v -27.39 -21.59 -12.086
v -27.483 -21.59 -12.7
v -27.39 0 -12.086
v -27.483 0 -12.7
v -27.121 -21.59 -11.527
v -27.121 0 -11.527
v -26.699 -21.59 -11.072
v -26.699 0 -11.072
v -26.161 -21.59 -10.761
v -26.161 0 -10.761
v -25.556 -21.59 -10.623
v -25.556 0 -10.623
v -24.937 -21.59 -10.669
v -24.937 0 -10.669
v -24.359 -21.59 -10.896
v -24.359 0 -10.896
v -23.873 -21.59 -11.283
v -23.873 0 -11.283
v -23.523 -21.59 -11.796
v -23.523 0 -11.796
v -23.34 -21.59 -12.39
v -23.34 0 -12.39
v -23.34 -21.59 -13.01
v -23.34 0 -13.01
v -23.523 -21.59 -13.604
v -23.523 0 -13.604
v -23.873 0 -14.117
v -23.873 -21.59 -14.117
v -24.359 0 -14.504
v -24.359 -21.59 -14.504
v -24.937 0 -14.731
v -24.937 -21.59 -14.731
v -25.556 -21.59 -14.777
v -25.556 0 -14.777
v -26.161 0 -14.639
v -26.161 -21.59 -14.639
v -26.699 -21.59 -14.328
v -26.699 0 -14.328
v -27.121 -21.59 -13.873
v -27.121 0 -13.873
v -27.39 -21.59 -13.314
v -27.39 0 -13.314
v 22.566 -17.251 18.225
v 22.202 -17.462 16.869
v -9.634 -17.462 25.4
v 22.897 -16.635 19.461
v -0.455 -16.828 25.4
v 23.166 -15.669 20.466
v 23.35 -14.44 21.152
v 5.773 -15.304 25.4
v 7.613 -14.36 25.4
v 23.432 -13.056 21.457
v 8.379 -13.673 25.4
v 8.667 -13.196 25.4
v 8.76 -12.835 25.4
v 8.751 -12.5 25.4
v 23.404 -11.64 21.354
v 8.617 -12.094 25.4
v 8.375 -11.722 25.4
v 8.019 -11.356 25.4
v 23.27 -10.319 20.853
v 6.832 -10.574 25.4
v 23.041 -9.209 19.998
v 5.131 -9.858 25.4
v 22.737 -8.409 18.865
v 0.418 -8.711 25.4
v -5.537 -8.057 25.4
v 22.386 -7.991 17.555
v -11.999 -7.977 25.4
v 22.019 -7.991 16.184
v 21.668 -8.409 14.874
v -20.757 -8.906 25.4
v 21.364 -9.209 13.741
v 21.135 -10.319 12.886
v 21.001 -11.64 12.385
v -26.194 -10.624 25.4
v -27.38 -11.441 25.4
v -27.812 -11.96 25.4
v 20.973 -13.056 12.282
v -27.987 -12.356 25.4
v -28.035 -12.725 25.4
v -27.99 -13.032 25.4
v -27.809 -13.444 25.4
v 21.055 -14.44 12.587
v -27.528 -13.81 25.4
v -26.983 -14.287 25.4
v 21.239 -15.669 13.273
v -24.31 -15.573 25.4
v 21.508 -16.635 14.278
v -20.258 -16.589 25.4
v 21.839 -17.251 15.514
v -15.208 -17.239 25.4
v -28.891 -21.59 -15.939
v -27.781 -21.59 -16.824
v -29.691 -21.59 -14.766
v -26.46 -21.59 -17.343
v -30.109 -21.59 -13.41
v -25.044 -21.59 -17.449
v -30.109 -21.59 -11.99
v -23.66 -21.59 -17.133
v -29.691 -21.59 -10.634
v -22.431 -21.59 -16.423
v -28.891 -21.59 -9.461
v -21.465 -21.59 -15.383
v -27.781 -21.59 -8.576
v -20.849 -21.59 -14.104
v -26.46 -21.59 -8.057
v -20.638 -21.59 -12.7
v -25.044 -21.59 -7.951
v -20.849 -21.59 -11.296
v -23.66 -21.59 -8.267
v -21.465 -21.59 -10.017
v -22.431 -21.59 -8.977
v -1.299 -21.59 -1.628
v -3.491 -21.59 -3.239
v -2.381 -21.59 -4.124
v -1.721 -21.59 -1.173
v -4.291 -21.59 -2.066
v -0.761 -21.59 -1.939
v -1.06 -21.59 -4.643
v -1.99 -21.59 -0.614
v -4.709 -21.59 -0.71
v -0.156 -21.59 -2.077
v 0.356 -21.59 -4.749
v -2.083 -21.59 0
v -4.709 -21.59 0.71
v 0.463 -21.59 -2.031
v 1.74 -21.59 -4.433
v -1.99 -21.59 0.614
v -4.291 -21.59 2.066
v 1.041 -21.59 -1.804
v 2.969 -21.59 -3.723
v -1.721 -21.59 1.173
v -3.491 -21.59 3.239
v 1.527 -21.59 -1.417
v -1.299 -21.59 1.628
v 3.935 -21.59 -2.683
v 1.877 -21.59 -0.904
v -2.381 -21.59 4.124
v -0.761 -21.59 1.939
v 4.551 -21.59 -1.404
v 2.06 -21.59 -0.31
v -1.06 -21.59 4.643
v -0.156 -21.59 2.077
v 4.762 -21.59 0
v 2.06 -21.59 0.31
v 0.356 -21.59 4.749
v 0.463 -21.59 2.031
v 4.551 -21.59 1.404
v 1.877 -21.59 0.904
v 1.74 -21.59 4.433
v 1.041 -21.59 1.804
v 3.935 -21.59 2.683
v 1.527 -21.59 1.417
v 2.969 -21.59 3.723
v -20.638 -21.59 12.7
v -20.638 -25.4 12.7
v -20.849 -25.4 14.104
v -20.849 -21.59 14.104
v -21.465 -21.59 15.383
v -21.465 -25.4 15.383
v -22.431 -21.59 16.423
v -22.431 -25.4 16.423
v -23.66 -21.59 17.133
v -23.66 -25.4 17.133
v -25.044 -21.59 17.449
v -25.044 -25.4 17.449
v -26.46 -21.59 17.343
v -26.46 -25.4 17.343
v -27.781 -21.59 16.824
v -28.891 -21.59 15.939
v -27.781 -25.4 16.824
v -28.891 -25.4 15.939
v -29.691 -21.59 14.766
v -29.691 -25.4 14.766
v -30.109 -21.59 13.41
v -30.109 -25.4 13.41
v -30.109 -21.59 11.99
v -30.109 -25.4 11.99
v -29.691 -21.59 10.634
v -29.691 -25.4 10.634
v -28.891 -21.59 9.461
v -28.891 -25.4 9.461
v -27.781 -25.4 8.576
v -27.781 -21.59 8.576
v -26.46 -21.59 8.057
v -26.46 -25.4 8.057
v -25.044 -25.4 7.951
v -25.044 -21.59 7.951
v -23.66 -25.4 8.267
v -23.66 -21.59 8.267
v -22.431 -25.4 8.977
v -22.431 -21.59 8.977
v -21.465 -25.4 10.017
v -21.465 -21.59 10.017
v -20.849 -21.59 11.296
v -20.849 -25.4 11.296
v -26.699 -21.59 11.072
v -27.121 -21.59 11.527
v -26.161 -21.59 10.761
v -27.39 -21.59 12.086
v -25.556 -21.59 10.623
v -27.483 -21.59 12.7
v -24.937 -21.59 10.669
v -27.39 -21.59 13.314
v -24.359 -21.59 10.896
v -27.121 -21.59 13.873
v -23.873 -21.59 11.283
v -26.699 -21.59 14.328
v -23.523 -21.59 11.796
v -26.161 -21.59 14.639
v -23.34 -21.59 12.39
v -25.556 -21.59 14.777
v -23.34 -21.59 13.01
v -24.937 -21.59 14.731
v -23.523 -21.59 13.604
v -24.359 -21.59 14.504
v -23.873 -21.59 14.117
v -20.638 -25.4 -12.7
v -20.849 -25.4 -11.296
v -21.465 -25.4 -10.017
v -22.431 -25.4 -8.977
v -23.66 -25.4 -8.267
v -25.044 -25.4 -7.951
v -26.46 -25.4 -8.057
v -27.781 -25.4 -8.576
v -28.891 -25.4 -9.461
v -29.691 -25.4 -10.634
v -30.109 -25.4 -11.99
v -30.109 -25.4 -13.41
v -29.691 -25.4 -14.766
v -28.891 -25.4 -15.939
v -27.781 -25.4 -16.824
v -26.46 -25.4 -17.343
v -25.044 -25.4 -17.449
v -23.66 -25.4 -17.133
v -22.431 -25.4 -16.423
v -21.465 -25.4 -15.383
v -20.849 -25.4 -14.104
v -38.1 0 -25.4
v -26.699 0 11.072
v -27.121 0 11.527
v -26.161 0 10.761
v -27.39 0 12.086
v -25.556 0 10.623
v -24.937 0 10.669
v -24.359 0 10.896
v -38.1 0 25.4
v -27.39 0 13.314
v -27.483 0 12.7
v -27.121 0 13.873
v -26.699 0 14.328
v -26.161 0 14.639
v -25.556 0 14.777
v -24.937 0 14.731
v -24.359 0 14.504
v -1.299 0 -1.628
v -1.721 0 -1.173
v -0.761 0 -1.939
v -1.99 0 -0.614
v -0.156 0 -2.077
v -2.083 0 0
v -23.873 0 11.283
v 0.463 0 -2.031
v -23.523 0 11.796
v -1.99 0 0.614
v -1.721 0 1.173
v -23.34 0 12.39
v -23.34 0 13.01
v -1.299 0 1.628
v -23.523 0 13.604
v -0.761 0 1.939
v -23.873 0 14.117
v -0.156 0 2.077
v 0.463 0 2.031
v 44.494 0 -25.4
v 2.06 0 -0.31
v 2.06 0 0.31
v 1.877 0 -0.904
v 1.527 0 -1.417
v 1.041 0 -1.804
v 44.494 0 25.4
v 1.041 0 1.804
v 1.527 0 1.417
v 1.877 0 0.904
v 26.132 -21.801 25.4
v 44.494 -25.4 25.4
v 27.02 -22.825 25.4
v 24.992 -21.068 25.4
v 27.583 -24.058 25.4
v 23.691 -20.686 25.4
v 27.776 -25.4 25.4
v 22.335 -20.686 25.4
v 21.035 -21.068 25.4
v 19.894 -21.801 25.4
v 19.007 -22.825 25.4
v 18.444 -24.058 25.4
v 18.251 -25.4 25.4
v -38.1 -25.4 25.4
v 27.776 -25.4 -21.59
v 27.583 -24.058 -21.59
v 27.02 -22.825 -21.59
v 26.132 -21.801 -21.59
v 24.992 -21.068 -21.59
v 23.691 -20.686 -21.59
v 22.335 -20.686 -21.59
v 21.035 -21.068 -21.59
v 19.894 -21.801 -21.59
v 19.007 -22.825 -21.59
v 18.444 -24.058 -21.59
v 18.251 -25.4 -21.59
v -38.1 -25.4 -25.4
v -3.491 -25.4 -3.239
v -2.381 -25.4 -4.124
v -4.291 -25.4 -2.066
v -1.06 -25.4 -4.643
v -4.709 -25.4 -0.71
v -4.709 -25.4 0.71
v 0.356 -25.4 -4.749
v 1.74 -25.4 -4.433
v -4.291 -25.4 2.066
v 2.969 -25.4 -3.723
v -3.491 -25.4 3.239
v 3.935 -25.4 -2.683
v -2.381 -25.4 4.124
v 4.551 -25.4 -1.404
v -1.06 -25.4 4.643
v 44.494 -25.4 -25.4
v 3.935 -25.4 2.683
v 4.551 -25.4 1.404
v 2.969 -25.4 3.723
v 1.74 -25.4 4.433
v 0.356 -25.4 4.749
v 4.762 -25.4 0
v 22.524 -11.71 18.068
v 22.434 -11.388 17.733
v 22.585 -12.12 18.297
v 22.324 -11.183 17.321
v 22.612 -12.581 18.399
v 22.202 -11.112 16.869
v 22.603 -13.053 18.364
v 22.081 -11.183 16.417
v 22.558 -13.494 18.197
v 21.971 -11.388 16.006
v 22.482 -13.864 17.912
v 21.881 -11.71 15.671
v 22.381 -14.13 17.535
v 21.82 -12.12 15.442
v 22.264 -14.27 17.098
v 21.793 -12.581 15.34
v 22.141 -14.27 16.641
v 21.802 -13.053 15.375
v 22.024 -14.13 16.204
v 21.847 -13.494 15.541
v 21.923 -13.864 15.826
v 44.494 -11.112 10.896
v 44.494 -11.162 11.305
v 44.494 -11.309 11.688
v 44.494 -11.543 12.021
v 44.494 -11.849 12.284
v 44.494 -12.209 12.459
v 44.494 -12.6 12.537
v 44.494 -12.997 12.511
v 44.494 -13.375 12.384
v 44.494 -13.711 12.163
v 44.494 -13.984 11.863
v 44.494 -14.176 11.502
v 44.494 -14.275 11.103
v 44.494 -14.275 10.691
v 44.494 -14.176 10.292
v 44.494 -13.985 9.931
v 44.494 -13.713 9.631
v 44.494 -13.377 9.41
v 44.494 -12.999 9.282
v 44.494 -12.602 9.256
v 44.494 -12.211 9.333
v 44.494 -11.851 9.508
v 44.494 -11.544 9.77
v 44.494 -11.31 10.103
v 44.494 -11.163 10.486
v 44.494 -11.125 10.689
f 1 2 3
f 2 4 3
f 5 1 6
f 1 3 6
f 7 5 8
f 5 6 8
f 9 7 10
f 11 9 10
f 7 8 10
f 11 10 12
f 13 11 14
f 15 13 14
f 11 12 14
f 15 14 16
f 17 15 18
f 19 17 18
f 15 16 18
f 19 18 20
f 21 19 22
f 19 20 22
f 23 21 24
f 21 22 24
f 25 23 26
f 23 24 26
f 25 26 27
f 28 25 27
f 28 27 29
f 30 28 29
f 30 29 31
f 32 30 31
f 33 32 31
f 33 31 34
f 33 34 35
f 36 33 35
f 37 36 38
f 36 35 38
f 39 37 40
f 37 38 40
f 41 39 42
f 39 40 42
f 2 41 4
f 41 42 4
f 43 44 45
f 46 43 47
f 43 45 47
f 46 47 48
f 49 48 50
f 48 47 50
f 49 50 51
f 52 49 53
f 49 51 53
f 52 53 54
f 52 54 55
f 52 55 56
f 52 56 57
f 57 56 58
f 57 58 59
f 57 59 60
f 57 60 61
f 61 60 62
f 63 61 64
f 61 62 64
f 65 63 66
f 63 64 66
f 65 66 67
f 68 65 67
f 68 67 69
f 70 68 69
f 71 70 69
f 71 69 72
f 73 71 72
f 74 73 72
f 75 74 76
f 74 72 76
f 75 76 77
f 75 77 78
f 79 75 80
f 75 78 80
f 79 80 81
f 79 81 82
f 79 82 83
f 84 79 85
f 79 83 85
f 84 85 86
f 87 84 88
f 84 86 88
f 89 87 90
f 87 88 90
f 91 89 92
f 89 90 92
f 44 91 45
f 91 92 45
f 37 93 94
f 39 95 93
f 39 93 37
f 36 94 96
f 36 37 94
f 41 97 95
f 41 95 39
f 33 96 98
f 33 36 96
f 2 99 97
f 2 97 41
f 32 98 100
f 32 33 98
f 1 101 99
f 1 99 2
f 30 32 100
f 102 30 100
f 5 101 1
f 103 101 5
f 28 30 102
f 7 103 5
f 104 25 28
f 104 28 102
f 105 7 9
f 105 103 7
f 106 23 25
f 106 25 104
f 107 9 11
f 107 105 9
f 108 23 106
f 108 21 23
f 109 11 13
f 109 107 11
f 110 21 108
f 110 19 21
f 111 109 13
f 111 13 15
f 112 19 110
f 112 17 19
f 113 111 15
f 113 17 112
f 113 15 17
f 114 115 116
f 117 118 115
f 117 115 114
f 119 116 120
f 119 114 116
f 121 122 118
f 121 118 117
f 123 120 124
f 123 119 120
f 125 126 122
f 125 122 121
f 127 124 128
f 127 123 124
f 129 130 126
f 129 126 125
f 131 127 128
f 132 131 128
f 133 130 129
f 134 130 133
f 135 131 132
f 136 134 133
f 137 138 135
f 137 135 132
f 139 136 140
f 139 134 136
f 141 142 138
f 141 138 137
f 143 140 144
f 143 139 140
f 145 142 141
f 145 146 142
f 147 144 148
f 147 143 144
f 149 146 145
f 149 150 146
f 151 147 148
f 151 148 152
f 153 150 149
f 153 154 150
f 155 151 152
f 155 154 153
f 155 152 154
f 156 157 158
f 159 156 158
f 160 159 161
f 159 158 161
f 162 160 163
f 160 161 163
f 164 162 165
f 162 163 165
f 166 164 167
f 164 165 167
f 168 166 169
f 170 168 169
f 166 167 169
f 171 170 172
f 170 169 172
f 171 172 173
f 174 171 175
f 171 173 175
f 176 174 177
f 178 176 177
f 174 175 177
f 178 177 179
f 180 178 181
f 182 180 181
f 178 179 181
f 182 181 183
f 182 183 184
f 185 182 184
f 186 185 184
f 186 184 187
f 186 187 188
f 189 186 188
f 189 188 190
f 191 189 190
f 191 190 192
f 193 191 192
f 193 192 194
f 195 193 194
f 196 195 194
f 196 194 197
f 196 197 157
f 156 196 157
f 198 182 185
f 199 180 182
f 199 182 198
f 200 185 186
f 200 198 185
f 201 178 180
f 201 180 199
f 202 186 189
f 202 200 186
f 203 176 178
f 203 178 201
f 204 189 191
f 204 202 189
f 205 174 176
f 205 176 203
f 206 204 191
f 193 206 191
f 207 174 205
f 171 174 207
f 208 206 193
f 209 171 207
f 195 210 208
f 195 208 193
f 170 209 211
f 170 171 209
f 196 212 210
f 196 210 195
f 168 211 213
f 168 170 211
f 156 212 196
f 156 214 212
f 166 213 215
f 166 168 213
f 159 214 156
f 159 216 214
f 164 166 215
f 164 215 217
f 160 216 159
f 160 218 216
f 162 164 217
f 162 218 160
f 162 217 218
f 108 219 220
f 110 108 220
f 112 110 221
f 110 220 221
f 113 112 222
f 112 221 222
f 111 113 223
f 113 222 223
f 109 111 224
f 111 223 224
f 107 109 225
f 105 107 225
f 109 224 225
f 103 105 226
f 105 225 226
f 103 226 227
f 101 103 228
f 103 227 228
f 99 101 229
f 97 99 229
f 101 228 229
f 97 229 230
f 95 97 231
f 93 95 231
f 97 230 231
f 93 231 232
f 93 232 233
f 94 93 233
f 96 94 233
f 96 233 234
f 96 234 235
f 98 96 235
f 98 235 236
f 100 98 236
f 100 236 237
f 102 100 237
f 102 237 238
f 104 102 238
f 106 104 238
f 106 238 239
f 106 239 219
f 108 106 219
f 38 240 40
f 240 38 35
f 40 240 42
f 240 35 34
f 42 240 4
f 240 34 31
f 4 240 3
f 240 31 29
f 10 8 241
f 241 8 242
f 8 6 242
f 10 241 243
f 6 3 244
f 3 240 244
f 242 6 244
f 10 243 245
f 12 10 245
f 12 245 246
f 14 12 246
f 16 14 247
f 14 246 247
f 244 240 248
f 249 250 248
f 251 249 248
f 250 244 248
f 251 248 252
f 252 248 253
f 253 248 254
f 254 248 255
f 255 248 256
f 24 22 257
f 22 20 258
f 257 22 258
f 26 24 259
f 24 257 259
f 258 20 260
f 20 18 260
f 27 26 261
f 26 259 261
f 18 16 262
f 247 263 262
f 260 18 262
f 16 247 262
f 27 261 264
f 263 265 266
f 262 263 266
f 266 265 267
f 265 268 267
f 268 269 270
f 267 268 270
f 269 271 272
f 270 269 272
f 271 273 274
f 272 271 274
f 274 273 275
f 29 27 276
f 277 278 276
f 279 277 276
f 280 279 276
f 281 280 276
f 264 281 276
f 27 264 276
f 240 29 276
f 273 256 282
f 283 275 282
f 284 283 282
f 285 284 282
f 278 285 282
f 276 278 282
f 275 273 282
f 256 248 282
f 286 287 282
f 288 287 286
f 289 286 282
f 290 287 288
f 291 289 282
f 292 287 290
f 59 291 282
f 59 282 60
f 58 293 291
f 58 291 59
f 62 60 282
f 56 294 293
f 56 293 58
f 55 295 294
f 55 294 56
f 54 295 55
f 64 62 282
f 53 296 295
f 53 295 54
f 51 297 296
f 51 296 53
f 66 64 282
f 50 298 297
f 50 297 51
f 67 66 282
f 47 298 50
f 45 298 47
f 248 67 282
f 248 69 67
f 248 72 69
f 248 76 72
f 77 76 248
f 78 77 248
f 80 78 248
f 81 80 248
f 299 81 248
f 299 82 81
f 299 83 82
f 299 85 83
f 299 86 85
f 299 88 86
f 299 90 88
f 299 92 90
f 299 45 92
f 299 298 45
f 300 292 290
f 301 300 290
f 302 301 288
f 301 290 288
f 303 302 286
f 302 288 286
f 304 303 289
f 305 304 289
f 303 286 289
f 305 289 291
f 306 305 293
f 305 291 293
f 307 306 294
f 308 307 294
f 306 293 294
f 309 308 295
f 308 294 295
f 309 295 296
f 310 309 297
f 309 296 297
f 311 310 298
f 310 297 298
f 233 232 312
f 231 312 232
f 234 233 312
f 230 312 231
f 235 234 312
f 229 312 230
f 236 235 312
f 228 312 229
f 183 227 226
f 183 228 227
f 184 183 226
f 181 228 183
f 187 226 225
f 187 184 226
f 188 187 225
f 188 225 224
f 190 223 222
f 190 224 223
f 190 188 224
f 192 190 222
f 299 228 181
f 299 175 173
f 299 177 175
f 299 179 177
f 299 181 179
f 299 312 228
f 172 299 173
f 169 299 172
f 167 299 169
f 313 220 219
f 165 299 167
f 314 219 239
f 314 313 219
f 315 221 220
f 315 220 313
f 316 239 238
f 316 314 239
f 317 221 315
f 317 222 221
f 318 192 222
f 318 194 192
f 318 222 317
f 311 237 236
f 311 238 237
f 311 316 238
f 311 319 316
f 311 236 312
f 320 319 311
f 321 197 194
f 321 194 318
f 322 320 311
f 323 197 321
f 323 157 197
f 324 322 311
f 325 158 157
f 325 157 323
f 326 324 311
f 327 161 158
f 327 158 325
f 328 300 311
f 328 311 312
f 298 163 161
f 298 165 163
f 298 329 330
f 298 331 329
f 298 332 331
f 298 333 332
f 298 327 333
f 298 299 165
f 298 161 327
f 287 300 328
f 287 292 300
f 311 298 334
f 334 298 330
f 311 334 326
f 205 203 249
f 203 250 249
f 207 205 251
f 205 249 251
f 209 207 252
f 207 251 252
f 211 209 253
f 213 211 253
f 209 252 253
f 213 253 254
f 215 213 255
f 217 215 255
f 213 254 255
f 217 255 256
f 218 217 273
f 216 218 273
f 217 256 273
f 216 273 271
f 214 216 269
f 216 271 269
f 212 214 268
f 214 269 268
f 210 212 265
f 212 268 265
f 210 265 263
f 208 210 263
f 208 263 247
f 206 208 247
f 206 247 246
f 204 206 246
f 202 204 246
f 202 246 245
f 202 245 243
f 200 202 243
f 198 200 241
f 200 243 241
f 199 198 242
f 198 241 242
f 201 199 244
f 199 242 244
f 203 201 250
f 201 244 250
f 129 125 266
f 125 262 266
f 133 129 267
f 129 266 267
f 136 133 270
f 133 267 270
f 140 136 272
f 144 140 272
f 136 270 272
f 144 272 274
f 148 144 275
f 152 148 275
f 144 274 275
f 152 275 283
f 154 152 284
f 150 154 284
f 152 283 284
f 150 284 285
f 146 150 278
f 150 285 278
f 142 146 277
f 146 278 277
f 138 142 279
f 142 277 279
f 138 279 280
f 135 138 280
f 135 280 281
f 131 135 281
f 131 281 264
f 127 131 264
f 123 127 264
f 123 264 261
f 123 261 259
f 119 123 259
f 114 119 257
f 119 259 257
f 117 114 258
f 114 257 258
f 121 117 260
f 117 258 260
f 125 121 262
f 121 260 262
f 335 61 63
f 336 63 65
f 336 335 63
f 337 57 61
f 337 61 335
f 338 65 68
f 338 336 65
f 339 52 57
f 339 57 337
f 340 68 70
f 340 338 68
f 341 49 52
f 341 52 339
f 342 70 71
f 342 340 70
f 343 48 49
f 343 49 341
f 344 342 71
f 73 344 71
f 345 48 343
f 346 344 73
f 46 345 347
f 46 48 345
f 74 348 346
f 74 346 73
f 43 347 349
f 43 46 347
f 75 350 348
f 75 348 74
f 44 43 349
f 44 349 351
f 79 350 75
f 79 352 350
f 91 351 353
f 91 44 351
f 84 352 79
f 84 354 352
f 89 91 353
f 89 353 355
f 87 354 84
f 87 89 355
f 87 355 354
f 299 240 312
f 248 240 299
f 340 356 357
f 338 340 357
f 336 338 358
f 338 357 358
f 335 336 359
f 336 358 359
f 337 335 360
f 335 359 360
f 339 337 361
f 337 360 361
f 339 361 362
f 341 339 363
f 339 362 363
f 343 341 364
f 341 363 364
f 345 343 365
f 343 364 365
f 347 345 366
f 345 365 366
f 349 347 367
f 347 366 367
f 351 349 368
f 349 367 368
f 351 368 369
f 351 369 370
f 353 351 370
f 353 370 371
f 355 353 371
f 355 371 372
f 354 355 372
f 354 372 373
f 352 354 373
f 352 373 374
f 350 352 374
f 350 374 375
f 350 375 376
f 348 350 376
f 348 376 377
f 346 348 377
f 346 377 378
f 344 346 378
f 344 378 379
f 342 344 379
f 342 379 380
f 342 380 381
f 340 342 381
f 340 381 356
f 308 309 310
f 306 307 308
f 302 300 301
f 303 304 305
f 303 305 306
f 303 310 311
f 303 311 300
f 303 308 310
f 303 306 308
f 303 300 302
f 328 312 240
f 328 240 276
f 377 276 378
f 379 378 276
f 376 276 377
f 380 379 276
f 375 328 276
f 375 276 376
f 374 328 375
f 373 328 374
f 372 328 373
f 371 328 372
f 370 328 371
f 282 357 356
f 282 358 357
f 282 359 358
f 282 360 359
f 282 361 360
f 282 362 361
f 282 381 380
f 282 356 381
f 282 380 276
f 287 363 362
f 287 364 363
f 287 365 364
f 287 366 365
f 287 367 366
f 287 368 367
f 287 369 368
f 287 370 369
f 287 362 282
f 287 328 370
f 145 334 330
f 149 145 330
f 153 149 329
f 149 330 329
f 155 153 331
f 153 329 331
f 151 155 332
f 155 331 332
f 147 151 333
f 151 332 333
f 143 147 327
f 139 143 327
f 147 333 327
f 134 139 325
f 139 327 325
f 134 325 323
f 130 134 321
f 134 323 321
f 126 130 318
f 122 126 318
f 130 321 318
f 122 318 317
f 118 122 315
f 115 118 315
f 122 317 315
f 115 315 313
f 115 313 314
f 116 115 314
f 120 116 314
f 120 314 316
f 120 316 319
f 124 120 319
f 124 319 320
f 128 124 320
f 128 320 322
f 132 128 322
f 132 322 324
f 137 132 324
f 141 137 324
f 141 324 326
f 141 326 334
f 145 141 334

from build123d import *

# Parameters (mm, degrees)
F0_W            = 76.2
F0_H            = 50.8
F1_DEPTH        = 25.4
F3_DEPTH        = 25.401
F5_D            = 9.525
F7_DEPTH        = 25.401
F9_DEPTH        = 25.401
F11_DEPTH       = 25.4
F13_D           = 3.175
F15_DEPTH       = 46.99
F17_D           = 4.1656
F17_CBORE_D     = 9.525
F17_CBORE_DEPTH = 3.81


with BuildPart() as f1:
    # F0 (on Front) → F1 (new body)
    with BuildSketch(Plane.XZ):
        Rectangle(F0_W, F0_H)
    extrude(amount=F1_DEPTH)

    # F2 (on face) → F3 (cut, through all)
    with BuildSketch(Plane.XZ.offset(25.4)):
        Polygon((38.1, -25.4), (38.1, 25.4), (24.4881810245, -25.4), align=None)
    extrude(amount=-F3_DEPTH, mode=Mode.SUBTRACT)

    # F5 (through all)
    with Locations(Plane(origin=(29.1977839421, 0, -7.8235226281), x_dir=(0, 1, 0), z_dir=(0.9659258263, 0, -0.2588190451))):
        with Locations((-12.7, 22.0410656184)):
            Hole(F5_D / 2)

    # F6 (on face) → F7 (cut, through all)
    with BuildSketch(Plane(origin=(0, 0, 0), x_dir=(-1, 0, 0), z_dir=(0, 1, 0))):
        Polygon((-24.4881810245, 25.4), (-38.1, 25.4), (-24.4881810245, -25.4), align=None)
    extrude(amount=-F7_DEPTH, mode=Mode.SUBTRACT)

    # F8 (on face) → F9 (cut, through all)
    with BuildSketch(Plane.XZ.offset(25.4)):
        Polygon((24.4881810245, -25.4), (24.4881810245, 25.4), (10.876362049, -25.4), align=None)
    extrude(amount=-F9_DEPTH, mode=Mode.SUBTRACT)

    # F10 (on face) → F11 (join)
    with BuildSketch(Plane.XZ.offset(25.4)):
        Polygon((44.4944761693, 25.4), (24.4881810245, 25.4), (10.876362049, -25.4), (44.4944761693, -25.4), align=None)
    extrude(amount=-F11_DEPTH)

    # F13 (through all)
    with Locations(Plane(origin=(16.4977839421, 0, -4.4205678842), x_dir=(0, -1, 0), z_dir=(-0.9659258263, 0, 0.2588190451))):
        with Locations((12.7, 22.0410656184)):
            Hole(F13_D / 2)

    # F14 (on face) → F15 (cut)
    with BuildSketch(Plane.XY.offset(25.4)):
        with BuildLine():
            ThreePointArc((27.7756870478, -25.4), (23.0131870478, -20.6375), (18.2506870478, -25.4))
            Line((18.2506870478, -25.4), (27.7756870478, -25.4))
        make_face()
    extrude(amount=-F15_DEPTH, mode=Mode.SUBTRACT)

    # F17 (through all)
    with Locations(Plane.XZ.offset(25.4)):
        with Locations((-25.4, -12.7), (-25.4, 12.7), (0, 0)):
            CounterBoreHole(F17_D / 2, F17_CBORE_D / 2, F17_CBORE_DEPTH)


solid = f1.part
